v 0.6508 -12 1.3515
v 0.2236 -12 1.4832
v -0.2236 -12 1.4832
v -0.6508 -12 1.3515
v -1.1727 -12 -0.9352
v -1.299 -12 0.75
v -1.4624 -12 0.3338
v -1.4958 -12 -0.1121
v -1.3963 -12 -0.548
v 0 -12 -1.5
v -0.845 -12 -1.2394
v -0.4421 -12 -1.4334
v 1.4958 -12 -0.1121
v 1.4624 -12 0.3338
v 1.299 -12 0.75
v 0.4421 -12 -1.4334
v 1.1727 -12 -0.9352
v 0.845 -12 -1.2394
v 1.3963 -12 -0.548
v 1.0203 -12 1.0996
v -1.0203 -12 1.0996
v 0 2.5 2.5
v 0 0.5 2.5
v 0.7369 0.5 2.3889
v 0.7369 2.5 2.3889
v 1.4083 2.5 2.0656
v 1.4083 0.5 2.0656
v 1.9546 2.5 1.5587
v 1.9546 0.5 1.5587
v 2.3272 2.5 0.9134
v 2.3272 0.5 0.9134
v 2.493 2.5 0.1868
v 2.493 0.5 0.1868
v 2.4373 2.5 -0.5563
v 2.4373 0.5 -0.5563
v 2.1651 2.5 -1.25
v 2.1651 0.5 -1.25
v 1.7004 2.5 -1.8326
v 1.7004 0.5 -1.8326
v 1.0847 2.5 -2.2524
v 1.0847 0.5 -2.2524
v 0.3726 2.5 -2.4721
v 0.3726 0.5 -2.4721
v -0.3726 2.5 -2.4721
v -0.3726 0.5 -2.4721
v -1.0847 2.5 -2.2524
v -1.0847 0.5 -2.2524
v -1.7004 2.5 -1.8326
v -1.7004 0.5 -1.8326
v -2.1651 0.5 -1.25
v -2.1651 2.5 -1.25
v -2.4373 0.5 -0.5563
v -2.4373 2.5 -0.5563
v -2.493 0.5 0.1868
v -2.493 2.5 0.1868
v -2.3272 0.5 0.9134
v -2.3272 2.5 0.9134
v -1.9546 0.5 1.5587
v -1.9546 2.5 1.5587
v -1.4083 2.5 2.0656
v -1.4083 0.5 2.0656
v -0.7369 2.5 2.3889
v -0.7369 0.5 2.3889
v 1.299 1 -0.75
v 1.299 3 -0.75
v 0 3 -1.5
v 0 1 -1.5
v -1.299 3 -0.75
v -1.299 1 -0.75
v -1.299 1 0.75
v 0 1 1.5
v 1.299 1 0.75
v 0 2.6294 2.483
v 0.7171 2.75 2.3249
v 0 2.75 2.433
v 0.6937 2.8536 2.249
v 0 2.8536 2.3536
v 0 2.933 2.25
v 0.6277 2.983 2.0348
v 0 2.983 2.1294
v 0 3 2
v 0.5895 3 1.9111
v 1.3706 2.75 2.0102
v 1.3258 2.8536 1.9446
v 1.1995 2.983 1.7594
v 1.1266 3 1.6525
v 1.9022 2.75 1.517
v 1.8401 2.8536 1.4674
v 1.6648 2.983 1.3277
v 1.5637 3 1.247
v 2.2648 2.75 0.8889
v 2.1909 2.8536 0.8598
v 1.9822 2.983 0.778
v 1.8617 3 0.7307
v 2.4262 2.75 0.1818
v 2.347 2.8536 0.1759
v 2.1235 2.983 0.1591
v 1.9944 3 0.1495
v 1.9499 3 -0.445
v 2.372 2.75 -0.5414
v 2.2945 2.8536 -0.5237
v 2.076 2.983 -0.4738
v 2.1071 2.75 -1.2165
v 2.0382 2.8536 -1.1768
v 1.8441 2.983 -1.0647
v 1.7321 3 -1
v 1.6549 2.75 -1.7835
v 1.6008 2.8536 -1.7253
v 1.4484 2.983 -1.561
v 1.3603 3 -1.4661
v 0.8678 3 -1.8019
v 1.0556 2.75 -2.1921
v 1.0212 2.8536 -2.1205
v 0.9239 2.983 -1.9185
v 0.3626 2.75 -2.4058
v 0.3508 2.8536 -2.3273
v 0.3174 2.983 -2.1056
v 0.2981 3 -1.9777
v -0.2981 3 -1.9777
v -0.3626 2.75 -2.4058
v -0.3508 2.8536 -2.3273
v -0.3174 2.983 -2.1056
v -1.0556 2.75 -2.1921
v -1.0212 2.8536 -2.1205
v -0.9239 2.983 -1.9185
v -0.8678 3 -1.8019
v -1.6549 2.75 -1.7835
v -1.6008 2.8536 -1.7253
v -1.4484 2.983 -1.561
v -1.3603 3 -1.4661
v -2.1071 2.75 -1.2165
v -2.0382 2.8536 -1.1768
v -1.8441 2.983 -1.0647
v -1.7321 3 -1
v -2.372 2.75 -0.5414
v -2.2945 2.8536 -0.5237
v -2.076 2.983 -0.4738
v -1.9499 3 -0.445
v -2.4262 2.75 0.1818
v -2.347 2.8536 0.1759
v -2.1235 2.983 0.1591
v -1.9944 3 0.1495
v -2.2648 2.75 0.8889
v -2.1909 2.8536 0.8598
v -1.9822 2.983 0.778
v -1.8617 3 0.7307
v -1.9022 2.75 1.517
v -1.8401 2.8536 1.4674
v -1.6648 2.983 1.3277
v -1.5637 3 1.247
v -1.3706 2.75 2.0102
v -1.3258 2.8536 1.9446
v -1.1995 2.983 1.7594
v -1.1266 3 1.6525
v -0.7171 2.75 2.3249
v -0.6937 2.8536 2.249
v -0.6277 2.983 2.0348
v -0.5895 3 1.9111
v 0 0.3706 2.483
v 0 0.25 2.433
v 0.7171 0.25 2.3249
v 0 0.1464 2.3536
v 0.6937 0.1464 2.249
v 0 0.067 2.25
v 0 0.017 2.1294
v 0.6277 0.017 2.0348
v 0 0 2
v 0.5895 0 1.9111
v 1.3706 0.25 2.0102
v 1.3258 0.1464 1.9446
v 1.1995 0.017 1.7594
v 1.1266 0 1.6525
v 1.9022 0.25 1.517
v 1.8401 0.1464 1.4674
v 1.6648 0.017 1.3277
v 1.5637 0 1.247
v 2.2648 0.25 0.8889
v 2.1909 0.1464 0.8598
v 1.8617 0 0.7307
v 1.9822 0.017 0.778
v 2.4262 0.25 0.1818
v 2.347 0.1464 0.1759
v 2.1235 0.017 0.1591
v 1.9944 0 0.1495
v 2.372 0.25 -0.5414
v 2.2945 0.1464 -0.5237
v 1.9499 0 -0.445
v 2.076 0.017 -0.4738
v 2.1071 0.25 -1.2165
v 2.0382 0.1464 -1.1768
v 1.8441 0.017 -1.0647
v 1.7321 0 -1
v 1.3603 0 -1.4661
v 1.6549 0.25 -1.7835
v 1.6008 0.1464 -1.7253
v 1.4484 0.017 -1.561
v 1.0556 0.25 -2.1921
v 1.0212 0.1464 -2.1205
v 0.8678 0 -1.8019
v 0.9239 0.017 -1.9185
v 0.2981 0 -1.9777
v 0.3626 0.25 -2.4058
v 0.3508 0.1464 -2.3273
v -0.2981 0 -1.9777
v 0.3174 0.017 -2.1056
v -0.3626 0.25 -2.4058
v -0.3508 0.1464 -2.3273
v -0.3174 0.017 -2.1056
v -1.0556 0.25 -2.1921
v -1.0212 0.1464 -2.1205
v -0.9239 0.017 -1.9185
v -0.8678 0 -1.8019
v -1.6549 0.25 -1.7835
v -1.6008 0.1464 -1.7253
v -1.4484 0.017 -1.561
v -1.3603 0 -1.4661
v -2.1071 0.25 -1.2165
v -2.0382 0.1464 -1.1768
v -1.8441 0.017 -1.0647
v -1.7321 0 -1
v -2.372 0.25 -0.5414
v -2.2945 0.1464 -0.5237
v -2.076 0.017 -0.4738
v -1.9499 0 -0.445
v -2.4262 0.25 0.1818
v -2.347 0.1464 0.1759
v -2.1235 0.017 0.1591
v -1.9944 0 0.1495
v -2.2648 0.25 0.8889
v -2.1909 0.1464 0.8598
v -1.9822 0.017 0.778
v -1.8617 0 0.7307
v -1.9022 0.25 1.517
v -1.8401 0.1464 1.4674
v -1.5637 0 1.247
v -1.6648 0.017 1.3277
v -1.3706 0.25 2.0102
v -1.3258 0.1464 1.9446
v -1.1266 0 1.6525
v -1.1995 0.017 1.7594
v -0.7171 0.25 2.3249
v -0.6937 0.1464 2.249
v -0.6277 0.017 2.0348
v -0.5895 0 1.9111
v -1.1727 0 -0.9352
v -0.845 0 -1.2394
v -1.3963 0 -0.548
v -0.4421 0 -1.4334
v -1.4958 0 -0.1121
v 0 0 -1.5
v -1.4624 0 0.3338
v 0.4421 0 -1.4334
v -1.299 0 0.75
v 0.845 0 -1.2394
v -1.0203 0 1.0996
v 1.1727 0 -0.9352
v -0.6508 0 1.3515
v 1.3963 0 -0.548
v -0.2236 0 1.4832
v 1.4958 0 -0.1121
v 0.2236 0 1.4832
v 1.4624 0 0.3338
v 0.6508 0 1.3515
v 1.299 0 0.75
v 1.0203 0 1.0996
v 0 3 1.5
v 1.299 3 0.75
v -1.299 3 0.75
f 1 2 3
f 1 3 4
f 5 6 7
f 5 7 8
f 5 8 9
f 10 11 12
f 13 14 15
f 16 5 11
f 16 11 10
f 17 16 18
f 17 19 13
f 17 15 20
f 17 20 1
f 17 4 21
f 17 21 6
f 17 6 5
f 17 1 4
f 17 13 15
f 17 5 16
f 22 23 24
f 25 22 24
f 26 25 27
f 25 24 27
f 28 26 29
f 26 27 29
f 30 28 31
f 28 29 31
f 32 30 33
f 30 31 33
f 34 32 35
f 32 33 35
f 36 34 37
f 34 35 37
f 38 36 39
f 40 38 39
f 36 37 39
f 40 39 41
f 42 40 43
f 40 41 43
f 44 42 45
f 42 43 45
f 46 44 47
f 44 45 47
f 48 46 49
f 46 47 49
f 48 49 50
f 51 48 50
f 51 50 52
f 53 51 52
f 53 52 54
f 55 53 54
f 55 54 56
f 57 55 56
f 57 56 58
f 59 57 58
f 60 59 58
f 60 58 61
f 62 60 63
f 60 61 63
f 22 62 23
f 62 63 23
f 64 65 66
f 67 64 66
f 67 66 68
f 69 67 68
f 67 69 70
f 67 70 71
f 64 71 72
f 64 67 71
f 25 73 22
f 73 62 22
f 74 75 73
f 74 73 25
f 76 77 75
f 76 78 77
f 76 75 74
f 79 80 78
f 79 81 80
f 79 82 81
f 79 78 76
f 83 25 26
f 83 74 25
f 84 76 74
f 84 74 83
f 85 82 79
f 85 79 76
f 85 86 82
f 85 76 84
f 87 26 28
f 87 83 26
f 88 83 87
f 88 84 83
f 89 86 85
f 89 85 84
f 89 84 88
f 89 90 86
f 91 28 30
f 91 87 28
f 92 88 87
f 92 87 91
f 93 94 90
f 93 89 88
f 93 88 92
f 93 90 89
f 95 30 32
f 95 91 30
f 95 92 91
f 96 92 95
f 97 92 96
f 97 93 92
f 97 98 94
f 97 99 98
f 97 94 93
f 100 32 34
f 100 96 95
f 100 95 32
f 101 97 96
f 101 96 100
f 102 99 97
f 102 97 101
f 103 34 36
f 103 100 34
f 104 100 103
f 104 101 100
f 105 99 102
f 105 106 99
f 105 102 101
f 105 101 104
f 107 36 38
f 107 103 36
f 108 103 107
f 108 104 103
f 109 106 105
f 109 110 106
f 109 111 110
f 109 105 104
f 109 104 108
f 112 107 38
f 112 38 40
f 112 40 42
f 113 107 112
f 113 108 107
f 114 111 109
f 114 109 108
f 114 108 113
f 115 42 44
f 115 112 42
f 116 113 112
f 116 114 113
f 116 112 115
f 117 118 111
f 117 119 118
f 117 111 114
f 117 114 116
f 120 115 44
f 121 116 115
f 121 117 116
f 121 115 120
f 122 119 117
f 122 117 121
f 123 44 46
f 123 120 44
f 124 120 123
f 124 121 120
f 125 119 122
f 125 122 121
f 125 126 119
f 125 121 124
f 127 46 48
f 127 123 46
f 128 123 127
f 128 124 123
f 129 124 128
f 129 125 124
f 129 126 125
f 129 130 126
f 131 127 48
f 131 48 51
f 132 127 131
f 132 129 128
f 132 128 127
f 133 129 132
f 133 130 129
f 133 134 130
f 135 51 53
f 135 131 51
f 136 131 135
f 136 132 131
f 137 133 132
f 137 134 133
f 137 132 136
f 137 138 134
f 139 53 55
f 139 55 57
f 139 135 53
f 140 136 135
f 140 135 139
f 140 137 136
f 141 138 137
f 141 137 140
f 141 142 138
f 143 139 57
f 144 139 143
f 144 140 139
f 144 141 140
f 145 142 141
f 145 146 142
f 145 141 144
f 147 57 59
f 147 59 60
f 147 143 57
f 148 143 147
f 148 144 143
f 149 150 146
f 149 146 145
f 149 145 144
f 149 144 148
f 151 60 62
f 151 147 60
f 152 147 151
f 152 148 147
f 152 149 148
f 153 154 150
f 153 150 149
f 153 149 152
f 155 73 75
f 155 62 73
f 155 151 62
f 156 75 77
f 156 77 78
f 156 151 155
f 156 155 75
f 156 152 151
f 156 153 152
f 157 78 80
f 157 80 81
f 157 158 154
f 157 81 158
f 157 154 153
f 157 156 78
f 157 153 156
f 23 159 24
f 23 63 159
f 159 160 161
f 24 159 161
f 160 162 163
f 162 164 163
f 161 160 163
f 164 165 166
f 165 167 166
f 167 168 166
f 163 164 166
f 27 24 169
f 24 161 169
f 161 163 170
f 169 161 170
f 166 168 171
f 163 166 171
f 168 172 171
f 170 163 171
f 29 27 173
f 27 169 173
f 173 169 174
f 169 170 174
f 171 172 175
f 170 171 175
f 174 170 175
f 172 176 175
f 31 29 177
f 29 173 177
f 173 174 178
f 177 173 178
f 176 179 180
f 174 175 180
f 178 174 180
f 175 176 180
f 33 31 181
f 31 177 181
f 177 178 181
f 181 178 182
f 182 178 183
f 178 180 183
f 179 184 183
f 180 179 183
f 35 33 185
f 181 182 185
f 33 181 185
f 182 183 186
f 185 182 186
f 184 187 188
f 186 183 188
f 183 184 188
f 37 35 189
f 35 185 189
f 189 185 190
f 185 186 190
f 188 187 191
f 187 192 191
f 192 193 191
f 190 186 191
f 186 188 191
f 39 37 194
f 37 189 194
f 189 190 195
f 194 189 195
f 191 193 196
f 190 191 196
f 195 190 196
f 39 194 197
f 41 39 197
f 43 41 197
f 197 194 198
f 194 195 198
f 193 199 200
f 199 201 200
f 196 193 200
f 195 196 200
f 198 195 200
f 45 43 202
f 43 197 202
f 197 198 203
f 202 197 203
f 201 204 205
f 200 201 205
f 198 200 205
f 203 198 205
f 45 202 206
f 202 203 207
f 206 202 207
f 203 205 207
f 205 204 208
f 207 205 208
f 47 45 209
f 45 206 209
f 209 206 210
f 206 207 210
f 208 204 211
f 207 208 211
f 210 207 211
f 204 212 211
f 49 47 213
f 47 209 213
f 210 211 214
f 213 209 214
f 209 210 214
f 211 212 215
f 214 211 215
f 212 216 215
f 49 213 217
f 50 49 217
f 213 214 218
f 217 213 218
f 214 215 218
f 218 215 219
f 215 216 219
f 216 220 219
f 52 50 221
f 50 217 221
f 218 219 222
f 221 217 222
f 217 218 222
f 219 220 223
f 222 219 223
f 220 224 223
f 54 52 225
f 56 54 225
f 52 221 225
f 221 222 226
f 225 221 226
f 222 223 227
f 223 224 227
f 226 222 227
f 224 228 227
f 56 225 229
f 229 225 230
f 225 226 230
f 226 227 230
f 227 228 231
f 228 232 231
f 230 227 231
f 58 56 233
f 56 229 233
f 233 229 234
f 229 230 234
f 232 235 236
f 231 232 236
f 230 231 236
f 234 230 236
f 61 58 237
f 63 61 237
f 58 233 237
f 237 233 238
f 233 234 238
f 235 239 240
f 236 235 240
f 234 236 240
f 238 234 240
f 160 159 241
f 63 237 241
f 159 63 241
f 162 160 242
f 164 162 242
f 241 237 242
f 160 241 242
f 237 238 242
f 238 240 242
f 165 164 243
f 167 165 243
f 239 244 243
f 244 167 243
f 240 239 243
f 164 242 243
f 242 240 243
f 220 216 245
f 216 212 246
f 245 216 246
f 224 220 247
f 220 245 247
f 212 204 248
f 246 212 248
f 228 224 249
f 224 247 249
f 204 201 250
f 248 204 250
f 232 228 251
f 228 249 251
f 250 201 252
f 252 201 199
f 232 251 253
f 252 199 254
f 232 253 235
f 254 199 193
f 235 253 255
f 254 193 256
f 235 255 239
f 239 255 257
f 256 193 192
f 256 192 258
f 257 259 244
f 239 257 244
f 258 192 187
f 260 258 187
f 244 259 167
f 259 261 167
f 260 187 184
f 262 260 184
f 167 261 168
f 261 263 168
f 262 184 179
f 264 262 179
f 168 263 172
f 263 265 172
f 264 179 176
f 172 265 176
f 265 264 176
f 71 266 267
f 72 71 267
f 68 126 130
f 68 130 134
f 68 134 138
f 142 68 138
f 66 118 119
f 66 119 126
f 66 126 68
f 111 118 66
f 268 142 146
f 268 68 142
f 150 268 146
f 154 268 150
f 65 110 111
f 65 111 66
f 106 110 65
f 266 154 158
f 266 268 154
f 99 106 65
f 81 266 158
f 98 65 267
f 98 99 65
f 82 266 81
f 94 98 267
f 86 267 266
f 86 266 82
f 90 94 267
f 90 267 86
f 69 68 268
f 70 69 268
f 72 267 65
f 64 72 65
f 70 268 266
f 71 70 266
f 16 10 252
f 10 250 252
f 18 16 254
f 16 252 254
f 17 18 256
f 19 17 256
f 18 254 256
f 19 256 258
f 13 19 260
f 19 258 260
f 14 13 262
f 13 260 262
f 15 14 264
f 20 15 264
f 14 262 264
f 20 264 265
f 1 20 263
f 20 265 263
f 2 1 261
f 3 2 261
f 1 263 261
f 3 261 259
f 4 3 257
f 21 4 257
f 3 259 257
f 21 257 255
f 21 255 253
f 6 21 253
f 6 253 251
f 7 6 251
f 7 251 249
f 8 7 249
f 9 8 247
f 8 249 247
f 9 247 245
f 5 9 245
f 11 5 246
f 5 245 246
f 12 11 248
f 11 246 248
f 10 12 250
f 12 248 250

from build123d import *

# Parameters (mm, degrees)
SKETCH_1_R          = 2.5
EXTRUDE_1_DEPTH     = 3
CUT_EXTRUDE_1_DEPTH = 2
SKETCH_3_R          = 1.5
EXTRUDE_2_DEPTH     = 10
FILLET_1_R          = 0.5
SKETCH_4_R          = 1.5
EXTRUDE_3_DEPTH     = 2


with BuildPart() as part:
    # 草图1 → 凸台-拉伸1 (new body)
    with BuildSketch(Plane(origin=(0, 0, 0), x_dir=(1, 0, 0), z_dir=(0, 1, 0))):
        with Locations(Location((0, 0, 0), (0, 0, 270))):
            Circle(SKETCH_1_R)
    extrude(amount=EXTRUDE_1_DEPTH)

    # 草图2 → 切除-拉伸1 (cut)
    with BuildSketch(Plane(origin=(0, 3, 0), x_dir=(1, 0, 0), z_dir=(0, 1, 0))):
        Polygon((0, 1.5), (-1.299038106, 0.75), (-1.299038106, -0.75), (0, -1.5), (1.299038106, -0.75), (1.299038106, 0.75), align=None)
    extrude(amount=-CUT_EXTRUDE_1_DEPTH, mode=Mode.SUBTRACT)

    # 草图3 → 凸台-拉伸2 (add)
    with BuildSketch(Plane.XZ):
        with Locations(Location((0, 0, 0), (0, 0, 270))):
            Circle(SKETCH_3_R)
    extrude(amount=EXTRUDE_2_DEPTH)

    # 圆角1
    fillet_1_edges = [part.edges().sort_by_distance(p)[0] for p in [
        (0, 0, -2.5),
        (0, 3, -2.5),
    ]]
    fillet(fillet_1_edges, radius=FILLET_1_R)

    # 草图4 → 凸台-拉伸3 (add)
    with BuildSketch(Plane.XZ.offset(10)):
        with Locations(Location((0, 0, 0), (0, 0, 270))):
            Circle(SKETCH_4_R)
    extrude(amount=EXTRUDE_3_DEPTH)


solid = part.part
